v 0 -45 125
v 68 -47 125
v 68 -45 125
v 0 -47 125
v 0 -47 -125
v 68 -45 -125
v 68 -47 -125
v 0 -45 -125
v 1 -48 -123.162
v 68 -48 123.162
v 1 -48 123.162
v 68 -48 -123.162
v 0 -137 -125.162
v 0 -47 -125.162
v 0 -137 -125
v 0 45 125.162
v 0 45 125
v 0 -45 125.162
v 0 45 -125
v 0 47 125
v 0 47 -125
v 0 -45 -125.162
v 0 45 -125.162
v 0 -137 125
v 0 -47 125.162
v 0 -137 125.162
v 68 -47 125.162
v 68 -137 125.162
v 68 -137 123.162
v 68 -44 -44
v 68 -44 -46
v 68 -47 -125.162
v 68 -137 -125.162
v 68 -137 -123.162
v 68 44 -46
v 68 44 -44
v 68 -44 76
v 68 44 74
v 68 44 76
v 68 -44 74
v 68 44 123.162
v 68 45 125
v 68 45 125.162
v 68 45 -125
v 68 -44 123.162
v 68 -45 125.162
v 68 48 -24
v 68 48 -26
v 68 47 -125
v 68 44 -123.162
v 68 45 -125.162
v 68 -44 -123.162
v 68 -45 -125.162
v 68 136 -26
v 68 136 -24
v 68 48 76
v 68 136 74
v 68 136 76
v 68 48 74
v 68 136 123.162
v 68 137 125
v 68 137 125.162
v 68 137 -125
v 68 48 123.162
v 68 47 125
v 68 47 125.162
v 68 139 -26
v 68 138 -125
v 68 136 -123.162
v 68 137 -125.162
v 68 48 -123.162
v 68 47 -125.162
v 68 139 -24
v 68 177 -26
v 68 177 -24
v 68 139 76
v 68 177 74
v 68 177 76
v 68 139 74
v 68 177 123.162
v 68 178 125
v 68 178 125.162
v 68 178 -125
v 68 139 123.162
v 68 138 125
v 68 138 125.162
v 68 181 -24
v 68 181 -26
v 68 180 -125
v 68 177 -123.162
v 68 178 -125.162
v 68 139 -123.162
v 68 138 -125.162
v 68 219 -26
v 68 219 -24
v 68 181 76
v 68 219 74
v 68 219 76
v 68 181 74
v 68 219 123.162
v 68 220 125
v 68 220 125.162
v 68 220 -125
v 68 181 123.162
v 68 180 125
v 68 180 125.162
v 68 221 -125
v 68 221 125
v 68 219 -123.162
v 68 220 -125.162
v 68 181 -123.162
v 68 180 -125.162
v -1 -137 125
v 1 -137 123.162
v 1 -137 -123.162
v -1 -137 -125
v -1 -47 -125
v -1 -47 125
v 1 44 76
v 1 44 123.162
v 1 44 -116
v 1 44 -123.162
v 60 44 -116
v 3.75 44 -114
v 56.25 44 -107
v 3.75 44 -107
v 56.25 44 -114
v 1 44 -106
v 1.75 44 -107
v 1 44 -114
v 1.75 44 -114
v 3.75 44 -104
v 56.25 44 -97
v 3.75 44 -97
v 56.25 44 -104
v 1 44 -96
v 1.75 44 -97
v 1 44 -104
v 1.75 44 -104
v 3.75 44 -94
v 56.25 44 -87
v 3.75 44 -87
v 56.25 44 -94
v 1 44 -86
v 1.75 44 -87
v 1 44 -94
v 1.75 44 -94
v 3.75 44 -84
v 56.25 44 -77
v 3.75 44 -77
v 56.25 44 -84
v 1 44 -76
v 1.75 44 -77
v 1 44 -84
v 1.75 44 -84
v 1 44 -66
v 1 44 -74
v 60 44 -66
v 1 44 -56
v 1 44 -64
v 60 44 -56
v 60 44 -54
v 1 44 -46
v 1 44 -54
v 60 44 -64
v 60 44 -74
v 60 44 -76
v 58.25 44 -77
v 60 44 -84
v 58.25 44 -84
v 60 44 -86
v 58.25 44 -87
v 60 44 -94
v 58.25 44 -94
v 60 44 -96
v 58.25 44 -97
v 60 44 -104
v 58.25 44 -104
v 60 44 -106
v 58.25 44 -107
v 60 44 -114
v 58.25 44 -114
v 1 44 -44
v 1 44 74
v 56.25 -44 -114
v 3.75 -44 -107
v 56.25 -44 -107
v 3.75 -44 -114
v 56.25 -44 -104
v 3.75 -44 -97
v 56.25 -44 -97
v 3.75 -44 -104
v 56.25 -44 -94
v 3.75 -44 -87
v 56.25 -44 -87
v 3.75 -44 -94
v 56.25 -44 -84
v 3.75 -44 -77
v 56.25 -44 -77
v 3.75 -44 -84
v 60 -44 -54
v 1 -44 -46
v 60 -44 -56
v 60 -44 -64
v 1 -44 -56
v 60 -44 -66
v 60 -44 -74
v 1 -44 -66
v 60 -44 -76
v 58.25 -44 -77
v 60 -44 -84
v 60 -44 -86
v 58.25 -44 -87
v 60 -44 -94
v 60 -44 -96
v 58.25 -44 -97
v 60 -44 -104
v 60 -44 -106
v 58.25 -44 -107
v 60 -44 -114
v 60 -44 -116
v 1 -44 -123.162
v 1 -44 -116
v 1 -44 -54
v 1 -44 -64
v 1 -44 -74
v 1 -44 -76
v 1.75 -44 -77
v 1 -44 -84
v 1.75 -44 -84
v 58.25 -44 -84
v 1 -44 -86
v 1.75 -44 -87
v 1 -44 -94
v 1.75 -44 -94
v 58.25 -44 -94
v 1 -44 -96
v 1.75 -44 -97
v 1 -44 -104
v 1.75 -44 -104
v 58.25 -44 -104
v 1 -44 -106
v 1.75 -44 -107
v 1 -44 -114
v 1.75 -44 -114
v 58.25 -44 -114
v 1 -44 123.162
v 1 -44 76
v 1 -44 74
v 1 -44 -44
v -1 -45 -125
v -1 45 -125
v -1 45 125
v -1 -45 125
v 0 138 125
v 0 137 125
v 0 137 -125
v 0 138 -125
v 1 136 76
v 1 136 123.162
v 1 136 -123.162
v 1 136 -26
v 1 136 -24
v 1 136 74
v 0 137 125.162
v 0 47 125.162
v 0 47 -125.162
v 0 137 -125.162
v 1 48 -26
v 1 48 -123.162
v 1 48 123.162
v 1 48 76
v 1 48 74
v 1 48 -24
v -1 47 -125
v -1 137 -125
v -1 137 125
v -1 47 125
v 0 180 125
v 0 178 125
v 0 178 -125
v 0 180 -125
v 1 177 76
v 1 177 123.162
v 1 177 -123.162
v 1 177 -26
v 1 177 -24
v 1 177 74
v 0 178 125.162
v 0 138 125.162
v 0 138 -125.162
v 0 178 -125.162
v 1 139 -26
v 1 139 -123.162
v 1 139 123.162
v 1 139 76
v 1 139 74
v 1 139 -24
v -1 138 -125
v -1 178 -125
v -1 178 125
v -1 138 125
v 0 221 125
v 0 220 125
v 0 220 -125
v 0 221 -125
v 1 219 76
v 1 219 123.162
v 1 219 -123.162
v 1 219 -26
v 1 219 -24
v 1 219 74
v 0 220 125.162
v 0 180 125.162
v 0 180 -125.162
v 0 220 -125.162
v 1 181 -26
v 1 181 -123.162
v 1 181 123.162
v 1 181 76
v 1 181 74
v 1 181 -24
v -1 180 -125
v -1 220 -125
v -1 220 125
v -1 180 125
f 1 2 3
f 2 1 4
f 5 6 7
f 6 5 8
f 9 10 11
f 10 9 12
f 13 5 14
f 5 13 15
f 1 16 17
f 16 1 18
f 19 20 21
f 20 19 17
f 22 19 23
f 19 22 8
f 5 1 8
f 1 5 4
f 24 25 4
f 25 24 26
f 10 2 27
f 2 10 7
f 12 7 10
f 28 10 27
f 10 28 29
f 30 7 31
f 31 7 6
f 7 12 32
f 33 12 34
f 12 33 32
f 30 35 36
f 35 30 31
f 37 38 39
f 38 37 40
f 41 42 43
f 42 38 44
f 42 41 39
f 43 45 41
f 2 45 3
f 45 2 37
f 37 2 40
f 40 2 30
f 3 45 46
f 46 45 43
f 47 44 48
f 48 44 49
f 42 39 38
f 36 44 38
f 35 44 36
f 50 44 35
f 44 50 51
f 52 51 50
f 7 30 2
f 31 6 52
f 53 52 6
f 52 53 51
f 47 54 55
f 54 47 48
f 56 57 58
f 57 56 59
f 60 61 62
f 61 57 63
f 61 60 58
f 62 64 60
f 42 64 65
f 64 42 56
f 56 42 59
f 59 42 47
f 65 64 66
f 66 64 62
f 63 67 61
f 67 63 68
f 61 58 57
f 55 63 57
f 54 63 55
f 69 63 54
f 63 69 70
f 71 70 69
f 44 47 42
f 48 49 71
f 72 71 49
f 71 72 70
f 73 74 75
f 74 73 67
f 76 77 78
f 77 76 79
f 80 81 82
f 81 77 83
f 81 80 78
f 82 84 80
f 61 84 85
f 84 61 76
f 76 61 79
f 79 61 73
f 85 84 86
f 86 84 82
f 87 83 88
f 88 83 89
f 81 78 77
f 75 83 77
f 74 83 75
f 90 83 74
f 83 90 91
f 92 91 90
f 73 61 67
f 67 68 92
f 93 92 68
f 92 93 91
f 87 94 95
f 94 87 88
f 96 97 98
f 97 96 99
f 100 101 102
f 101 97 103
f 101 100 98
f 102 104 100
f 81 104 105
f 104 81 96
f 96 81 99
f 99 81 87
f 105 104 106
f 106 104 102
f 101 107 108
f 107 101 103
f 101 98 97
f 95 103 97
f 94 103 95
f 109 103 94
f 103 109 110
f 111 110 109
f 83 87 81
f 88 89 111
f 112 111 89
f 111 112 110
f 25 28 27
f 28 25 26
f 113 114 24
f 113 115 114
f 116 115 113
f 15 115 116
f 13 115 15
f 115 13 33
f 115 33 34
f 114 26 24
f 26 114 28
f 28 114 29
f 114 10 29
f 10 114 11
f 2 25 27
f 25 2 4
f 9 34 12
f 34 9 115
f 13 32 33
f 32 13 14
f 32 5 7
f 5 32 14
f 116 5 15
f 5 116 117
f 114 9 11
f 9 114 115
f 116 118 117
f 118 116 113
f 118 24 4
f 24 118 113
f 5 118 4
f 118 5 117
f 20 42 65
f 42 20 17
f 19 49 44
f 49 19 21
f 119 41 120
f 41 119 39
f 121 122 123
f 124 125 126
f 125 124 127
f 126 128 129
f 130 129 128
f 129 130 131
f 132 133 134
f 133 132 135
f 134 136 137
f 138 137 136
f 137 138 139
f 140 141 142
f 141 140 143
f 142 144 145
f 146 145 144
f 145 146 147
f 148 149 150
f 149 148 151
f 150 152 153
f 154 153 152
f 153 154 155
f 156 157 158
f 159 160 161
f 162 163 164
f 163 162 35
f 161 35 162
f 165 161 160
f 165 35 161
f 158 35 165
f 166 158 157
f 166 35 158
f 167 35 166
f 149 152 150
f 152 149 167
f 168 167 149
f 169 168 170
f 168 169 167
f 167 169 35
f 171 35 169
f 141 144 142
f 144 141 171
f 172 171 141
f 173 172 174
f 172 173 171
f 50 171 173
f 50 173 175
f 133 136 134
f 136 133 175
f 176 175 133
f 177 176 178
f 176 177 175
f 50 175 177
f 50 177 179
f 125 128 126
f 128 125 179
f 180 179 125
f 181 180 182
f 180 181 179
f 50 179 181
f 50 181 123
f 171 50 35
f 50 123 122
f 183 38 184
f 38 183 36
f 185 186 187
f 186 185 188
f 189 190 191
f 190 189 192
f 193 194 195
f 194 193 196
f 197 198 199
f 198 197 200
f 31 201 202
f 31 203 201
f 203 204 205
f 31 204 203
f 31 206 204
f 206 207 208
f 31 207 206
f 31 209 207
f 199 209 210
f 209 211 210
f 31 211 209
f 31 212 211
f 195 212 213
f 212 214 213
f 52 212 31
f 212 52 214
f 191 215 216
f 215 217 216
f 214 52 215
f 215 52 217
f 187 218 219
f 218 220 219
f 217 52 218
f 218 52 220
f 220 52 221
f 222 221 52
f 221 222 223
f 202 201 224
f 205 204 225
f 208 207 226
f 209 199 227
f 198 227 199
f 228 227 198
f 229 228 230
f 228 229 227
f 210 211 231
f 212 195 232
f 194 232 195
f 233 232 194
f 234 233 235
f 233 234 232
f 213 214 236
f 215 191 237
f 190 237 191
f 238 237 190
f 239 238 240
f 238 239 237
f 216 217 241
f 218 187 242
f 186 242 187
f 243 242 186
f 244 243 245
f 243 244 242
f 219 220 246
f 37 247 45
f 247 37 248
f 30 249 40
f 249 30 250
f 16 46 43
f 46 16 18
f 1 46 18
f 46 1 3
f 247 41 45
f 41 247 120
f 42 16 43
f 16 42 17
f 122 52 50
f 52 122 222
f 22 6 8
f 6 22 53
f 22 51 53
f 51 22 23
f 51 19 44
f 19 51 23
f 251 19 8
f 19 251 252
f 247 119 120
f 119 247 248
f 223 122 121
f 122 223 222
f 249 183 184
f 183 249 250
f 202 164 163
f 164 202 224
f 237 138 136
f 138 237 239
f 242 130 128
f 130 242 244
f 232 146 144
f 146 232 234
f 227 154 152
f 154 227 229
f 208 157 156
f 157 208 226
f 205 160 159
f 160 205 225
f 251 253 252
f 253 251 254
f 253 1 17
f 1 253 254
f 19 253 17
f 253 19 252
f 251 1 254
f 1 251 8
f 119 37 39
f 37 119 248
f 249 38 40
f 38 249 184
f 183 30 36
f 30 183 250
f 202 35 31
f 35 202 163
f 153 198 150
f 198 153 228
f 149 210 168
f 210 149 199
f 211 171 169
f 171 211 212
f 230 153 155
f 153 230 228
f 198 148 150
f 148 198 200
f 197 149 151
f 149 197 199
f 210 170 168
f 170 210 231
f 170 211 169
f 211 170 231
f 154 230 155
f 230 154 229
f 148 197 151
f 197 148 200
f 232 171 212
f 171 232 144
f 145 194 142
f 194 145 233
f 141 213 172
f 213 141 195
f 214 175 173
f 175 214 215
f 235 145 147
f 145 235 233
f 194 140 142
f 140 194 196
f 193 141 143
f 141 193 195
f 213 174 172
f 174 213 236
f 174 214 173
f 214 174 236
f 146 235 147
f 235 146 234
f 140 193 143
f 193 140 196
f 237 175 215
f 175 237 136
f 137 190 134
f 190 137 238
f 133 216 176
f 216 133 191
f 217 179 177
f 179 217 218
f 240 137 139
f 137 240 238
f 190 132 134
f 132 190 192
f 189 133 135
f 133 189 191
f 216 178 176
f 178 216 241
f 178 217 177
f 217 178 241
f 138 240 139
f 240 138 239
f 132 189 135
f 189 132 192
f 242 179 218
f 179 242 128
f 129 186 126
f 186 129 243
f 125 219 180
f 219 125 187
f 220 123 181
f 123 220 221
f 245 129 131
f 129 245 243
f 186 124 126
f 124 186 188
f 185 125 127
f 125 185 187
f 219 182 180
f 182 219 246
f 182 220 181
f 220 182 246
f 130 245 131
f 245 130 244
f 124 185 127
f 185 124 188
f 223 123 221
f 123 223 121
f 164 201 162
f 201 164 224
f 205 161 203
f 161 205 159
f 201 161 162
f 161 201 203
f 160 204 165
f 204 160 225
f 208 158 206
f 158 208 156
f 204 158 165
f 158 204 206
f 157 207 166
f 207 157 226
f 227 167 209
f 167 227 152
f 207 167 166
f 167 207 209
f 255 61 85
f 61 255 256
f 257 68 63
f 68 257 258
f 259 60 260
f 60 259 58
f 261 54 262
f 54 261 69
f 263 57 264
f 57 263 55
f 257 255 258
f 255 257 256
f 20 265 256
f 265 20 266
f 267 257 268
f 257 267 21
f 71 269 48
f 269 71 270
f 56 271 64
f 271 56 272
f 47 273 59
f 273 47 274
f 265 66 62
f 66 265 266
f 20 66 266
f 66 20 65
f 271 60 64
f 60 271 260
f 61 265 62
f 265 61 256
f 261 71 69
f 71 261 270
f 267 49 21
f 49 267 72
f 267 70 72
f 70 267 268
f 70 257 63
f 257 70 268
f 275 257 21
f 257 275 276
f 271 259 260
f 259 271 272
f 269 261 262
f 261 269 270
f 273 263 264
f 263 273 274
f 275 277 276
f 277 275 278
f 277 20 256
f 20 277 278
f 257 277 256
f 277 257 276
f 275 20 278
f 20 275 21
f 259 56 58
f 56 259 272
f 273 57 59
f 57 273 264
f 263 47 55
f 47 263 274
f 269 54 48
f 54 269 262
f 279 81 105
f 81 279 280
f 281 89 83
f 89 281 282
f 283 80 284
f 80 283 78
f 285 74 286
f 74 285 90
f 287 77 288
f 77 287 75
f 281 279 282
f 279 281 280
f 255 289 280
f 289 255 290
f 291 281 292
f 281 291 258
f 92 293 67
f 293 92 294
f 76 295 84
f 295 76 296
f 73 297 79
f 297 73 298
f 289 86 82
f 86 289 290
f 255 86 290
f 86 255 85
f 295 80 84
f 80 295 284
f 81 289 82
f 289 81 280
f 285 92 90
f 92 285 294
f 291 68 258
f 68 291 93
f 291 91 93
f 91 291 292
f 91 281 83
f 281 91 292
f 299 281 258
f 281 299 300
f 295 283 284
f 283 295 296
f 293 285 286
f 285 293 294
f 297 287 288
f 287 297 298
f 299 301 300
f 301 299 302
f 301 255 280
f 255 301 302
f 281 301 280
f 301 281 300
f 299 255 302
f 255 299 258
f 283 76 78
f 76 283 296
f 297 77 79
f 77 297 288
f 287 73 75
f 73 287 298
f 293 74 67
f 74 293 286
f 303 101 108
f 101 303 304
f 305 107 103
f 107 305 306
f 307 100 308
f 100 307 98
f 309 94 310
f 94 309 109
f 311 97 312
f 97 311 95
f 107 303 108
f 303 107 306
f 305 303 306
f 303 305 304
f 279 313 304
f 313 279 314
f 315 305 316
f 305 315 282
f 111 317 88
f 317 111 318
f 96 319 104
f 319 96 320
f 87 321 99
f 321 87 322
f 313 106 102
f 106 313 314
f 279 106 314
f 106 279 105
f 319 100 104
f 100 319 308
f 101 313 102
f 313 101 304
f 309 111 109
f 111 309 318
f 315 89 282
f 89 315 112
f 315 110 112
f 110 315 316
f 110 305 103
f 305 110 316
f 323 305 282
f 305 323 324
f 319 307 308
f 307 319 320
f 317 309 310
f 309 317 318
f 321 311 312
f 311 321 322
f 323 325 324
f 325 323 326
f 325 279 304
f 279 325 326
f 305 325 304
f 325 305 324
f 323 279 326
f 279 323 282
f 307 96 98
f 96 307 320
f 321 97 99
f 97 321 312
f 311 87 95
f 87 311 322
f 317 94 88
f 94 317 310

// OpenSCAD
use <libcloset.scad>;

//uma das paredes do closet modular
_vetorcaixa1 = [250,90,68]; //altura,largura,profundidade
_vetorcaixa2 = [250,40,68];
distxu1=25;
pcompu1=80;
pprofu1=40;
gcompu1=40;
gprofu1=80;
permiteMeiou1=false;
comLEu1=false;

module parede1() {
    
    translate([0,-2-_vetorcaixa1.y,0]) 
    unidadeGavetasPlacas(dx=distxu1,pcomp=pcompu1,pprof=pprofu1,
    gcomp=gcompu1,gprof=gprofu1, vetorcaixa=_vetorcaixa1, permiteMeio=permiteMeiou1, comLE=comLEu1);
    
    unidadeGavetasPlacas(dx=25,pcomp=90,pprof=60,gcomp=60,gprof=90, vetorcaixa=_vetorcaixa1, permiteMaleiro=true, pMaleiro=50, permiteMeio=true,inf=true,dist=10, n=7, la=8, v=[0,0,0,1,1,1,1], moverMeio = -20);
    
    translate([0,2+_vetorcaixa1.y,0]) unidadeGavetasPlacas(
    dx=25,pcomp=90,pprof=40,gcomp=40,gprof=90, 
    vetorcaixa=_vetorcaixa1,
    permiteMaleiro=true, 
    pMaleiro=50, permiteMeio=true); 
    
    
    translate([0,2+_vetorcaixa1.y*2-24,0]) 
    unidadeGavetasPlacas(dx=25,pcomp=40,pprof=40,
    gcomp=40,gprof=40,vetorcaixa=_vetorcaixa2, 
    permiteMaleiro=true, pMaleiro=50, permiteMeio=true);  

    translate([0,2+_vetorcaixa1.y*3-72,0]) 
    unidadeGavetasPlacas(dx=25,pcomp=40,pprof=40,
    gcomp=40,gprof=40,vetorcaixa=_vetorcaixa2, 
    permiteMaleiro=true, pMaleiro=50, permiteMeio=true);  
    
}

parede1();
